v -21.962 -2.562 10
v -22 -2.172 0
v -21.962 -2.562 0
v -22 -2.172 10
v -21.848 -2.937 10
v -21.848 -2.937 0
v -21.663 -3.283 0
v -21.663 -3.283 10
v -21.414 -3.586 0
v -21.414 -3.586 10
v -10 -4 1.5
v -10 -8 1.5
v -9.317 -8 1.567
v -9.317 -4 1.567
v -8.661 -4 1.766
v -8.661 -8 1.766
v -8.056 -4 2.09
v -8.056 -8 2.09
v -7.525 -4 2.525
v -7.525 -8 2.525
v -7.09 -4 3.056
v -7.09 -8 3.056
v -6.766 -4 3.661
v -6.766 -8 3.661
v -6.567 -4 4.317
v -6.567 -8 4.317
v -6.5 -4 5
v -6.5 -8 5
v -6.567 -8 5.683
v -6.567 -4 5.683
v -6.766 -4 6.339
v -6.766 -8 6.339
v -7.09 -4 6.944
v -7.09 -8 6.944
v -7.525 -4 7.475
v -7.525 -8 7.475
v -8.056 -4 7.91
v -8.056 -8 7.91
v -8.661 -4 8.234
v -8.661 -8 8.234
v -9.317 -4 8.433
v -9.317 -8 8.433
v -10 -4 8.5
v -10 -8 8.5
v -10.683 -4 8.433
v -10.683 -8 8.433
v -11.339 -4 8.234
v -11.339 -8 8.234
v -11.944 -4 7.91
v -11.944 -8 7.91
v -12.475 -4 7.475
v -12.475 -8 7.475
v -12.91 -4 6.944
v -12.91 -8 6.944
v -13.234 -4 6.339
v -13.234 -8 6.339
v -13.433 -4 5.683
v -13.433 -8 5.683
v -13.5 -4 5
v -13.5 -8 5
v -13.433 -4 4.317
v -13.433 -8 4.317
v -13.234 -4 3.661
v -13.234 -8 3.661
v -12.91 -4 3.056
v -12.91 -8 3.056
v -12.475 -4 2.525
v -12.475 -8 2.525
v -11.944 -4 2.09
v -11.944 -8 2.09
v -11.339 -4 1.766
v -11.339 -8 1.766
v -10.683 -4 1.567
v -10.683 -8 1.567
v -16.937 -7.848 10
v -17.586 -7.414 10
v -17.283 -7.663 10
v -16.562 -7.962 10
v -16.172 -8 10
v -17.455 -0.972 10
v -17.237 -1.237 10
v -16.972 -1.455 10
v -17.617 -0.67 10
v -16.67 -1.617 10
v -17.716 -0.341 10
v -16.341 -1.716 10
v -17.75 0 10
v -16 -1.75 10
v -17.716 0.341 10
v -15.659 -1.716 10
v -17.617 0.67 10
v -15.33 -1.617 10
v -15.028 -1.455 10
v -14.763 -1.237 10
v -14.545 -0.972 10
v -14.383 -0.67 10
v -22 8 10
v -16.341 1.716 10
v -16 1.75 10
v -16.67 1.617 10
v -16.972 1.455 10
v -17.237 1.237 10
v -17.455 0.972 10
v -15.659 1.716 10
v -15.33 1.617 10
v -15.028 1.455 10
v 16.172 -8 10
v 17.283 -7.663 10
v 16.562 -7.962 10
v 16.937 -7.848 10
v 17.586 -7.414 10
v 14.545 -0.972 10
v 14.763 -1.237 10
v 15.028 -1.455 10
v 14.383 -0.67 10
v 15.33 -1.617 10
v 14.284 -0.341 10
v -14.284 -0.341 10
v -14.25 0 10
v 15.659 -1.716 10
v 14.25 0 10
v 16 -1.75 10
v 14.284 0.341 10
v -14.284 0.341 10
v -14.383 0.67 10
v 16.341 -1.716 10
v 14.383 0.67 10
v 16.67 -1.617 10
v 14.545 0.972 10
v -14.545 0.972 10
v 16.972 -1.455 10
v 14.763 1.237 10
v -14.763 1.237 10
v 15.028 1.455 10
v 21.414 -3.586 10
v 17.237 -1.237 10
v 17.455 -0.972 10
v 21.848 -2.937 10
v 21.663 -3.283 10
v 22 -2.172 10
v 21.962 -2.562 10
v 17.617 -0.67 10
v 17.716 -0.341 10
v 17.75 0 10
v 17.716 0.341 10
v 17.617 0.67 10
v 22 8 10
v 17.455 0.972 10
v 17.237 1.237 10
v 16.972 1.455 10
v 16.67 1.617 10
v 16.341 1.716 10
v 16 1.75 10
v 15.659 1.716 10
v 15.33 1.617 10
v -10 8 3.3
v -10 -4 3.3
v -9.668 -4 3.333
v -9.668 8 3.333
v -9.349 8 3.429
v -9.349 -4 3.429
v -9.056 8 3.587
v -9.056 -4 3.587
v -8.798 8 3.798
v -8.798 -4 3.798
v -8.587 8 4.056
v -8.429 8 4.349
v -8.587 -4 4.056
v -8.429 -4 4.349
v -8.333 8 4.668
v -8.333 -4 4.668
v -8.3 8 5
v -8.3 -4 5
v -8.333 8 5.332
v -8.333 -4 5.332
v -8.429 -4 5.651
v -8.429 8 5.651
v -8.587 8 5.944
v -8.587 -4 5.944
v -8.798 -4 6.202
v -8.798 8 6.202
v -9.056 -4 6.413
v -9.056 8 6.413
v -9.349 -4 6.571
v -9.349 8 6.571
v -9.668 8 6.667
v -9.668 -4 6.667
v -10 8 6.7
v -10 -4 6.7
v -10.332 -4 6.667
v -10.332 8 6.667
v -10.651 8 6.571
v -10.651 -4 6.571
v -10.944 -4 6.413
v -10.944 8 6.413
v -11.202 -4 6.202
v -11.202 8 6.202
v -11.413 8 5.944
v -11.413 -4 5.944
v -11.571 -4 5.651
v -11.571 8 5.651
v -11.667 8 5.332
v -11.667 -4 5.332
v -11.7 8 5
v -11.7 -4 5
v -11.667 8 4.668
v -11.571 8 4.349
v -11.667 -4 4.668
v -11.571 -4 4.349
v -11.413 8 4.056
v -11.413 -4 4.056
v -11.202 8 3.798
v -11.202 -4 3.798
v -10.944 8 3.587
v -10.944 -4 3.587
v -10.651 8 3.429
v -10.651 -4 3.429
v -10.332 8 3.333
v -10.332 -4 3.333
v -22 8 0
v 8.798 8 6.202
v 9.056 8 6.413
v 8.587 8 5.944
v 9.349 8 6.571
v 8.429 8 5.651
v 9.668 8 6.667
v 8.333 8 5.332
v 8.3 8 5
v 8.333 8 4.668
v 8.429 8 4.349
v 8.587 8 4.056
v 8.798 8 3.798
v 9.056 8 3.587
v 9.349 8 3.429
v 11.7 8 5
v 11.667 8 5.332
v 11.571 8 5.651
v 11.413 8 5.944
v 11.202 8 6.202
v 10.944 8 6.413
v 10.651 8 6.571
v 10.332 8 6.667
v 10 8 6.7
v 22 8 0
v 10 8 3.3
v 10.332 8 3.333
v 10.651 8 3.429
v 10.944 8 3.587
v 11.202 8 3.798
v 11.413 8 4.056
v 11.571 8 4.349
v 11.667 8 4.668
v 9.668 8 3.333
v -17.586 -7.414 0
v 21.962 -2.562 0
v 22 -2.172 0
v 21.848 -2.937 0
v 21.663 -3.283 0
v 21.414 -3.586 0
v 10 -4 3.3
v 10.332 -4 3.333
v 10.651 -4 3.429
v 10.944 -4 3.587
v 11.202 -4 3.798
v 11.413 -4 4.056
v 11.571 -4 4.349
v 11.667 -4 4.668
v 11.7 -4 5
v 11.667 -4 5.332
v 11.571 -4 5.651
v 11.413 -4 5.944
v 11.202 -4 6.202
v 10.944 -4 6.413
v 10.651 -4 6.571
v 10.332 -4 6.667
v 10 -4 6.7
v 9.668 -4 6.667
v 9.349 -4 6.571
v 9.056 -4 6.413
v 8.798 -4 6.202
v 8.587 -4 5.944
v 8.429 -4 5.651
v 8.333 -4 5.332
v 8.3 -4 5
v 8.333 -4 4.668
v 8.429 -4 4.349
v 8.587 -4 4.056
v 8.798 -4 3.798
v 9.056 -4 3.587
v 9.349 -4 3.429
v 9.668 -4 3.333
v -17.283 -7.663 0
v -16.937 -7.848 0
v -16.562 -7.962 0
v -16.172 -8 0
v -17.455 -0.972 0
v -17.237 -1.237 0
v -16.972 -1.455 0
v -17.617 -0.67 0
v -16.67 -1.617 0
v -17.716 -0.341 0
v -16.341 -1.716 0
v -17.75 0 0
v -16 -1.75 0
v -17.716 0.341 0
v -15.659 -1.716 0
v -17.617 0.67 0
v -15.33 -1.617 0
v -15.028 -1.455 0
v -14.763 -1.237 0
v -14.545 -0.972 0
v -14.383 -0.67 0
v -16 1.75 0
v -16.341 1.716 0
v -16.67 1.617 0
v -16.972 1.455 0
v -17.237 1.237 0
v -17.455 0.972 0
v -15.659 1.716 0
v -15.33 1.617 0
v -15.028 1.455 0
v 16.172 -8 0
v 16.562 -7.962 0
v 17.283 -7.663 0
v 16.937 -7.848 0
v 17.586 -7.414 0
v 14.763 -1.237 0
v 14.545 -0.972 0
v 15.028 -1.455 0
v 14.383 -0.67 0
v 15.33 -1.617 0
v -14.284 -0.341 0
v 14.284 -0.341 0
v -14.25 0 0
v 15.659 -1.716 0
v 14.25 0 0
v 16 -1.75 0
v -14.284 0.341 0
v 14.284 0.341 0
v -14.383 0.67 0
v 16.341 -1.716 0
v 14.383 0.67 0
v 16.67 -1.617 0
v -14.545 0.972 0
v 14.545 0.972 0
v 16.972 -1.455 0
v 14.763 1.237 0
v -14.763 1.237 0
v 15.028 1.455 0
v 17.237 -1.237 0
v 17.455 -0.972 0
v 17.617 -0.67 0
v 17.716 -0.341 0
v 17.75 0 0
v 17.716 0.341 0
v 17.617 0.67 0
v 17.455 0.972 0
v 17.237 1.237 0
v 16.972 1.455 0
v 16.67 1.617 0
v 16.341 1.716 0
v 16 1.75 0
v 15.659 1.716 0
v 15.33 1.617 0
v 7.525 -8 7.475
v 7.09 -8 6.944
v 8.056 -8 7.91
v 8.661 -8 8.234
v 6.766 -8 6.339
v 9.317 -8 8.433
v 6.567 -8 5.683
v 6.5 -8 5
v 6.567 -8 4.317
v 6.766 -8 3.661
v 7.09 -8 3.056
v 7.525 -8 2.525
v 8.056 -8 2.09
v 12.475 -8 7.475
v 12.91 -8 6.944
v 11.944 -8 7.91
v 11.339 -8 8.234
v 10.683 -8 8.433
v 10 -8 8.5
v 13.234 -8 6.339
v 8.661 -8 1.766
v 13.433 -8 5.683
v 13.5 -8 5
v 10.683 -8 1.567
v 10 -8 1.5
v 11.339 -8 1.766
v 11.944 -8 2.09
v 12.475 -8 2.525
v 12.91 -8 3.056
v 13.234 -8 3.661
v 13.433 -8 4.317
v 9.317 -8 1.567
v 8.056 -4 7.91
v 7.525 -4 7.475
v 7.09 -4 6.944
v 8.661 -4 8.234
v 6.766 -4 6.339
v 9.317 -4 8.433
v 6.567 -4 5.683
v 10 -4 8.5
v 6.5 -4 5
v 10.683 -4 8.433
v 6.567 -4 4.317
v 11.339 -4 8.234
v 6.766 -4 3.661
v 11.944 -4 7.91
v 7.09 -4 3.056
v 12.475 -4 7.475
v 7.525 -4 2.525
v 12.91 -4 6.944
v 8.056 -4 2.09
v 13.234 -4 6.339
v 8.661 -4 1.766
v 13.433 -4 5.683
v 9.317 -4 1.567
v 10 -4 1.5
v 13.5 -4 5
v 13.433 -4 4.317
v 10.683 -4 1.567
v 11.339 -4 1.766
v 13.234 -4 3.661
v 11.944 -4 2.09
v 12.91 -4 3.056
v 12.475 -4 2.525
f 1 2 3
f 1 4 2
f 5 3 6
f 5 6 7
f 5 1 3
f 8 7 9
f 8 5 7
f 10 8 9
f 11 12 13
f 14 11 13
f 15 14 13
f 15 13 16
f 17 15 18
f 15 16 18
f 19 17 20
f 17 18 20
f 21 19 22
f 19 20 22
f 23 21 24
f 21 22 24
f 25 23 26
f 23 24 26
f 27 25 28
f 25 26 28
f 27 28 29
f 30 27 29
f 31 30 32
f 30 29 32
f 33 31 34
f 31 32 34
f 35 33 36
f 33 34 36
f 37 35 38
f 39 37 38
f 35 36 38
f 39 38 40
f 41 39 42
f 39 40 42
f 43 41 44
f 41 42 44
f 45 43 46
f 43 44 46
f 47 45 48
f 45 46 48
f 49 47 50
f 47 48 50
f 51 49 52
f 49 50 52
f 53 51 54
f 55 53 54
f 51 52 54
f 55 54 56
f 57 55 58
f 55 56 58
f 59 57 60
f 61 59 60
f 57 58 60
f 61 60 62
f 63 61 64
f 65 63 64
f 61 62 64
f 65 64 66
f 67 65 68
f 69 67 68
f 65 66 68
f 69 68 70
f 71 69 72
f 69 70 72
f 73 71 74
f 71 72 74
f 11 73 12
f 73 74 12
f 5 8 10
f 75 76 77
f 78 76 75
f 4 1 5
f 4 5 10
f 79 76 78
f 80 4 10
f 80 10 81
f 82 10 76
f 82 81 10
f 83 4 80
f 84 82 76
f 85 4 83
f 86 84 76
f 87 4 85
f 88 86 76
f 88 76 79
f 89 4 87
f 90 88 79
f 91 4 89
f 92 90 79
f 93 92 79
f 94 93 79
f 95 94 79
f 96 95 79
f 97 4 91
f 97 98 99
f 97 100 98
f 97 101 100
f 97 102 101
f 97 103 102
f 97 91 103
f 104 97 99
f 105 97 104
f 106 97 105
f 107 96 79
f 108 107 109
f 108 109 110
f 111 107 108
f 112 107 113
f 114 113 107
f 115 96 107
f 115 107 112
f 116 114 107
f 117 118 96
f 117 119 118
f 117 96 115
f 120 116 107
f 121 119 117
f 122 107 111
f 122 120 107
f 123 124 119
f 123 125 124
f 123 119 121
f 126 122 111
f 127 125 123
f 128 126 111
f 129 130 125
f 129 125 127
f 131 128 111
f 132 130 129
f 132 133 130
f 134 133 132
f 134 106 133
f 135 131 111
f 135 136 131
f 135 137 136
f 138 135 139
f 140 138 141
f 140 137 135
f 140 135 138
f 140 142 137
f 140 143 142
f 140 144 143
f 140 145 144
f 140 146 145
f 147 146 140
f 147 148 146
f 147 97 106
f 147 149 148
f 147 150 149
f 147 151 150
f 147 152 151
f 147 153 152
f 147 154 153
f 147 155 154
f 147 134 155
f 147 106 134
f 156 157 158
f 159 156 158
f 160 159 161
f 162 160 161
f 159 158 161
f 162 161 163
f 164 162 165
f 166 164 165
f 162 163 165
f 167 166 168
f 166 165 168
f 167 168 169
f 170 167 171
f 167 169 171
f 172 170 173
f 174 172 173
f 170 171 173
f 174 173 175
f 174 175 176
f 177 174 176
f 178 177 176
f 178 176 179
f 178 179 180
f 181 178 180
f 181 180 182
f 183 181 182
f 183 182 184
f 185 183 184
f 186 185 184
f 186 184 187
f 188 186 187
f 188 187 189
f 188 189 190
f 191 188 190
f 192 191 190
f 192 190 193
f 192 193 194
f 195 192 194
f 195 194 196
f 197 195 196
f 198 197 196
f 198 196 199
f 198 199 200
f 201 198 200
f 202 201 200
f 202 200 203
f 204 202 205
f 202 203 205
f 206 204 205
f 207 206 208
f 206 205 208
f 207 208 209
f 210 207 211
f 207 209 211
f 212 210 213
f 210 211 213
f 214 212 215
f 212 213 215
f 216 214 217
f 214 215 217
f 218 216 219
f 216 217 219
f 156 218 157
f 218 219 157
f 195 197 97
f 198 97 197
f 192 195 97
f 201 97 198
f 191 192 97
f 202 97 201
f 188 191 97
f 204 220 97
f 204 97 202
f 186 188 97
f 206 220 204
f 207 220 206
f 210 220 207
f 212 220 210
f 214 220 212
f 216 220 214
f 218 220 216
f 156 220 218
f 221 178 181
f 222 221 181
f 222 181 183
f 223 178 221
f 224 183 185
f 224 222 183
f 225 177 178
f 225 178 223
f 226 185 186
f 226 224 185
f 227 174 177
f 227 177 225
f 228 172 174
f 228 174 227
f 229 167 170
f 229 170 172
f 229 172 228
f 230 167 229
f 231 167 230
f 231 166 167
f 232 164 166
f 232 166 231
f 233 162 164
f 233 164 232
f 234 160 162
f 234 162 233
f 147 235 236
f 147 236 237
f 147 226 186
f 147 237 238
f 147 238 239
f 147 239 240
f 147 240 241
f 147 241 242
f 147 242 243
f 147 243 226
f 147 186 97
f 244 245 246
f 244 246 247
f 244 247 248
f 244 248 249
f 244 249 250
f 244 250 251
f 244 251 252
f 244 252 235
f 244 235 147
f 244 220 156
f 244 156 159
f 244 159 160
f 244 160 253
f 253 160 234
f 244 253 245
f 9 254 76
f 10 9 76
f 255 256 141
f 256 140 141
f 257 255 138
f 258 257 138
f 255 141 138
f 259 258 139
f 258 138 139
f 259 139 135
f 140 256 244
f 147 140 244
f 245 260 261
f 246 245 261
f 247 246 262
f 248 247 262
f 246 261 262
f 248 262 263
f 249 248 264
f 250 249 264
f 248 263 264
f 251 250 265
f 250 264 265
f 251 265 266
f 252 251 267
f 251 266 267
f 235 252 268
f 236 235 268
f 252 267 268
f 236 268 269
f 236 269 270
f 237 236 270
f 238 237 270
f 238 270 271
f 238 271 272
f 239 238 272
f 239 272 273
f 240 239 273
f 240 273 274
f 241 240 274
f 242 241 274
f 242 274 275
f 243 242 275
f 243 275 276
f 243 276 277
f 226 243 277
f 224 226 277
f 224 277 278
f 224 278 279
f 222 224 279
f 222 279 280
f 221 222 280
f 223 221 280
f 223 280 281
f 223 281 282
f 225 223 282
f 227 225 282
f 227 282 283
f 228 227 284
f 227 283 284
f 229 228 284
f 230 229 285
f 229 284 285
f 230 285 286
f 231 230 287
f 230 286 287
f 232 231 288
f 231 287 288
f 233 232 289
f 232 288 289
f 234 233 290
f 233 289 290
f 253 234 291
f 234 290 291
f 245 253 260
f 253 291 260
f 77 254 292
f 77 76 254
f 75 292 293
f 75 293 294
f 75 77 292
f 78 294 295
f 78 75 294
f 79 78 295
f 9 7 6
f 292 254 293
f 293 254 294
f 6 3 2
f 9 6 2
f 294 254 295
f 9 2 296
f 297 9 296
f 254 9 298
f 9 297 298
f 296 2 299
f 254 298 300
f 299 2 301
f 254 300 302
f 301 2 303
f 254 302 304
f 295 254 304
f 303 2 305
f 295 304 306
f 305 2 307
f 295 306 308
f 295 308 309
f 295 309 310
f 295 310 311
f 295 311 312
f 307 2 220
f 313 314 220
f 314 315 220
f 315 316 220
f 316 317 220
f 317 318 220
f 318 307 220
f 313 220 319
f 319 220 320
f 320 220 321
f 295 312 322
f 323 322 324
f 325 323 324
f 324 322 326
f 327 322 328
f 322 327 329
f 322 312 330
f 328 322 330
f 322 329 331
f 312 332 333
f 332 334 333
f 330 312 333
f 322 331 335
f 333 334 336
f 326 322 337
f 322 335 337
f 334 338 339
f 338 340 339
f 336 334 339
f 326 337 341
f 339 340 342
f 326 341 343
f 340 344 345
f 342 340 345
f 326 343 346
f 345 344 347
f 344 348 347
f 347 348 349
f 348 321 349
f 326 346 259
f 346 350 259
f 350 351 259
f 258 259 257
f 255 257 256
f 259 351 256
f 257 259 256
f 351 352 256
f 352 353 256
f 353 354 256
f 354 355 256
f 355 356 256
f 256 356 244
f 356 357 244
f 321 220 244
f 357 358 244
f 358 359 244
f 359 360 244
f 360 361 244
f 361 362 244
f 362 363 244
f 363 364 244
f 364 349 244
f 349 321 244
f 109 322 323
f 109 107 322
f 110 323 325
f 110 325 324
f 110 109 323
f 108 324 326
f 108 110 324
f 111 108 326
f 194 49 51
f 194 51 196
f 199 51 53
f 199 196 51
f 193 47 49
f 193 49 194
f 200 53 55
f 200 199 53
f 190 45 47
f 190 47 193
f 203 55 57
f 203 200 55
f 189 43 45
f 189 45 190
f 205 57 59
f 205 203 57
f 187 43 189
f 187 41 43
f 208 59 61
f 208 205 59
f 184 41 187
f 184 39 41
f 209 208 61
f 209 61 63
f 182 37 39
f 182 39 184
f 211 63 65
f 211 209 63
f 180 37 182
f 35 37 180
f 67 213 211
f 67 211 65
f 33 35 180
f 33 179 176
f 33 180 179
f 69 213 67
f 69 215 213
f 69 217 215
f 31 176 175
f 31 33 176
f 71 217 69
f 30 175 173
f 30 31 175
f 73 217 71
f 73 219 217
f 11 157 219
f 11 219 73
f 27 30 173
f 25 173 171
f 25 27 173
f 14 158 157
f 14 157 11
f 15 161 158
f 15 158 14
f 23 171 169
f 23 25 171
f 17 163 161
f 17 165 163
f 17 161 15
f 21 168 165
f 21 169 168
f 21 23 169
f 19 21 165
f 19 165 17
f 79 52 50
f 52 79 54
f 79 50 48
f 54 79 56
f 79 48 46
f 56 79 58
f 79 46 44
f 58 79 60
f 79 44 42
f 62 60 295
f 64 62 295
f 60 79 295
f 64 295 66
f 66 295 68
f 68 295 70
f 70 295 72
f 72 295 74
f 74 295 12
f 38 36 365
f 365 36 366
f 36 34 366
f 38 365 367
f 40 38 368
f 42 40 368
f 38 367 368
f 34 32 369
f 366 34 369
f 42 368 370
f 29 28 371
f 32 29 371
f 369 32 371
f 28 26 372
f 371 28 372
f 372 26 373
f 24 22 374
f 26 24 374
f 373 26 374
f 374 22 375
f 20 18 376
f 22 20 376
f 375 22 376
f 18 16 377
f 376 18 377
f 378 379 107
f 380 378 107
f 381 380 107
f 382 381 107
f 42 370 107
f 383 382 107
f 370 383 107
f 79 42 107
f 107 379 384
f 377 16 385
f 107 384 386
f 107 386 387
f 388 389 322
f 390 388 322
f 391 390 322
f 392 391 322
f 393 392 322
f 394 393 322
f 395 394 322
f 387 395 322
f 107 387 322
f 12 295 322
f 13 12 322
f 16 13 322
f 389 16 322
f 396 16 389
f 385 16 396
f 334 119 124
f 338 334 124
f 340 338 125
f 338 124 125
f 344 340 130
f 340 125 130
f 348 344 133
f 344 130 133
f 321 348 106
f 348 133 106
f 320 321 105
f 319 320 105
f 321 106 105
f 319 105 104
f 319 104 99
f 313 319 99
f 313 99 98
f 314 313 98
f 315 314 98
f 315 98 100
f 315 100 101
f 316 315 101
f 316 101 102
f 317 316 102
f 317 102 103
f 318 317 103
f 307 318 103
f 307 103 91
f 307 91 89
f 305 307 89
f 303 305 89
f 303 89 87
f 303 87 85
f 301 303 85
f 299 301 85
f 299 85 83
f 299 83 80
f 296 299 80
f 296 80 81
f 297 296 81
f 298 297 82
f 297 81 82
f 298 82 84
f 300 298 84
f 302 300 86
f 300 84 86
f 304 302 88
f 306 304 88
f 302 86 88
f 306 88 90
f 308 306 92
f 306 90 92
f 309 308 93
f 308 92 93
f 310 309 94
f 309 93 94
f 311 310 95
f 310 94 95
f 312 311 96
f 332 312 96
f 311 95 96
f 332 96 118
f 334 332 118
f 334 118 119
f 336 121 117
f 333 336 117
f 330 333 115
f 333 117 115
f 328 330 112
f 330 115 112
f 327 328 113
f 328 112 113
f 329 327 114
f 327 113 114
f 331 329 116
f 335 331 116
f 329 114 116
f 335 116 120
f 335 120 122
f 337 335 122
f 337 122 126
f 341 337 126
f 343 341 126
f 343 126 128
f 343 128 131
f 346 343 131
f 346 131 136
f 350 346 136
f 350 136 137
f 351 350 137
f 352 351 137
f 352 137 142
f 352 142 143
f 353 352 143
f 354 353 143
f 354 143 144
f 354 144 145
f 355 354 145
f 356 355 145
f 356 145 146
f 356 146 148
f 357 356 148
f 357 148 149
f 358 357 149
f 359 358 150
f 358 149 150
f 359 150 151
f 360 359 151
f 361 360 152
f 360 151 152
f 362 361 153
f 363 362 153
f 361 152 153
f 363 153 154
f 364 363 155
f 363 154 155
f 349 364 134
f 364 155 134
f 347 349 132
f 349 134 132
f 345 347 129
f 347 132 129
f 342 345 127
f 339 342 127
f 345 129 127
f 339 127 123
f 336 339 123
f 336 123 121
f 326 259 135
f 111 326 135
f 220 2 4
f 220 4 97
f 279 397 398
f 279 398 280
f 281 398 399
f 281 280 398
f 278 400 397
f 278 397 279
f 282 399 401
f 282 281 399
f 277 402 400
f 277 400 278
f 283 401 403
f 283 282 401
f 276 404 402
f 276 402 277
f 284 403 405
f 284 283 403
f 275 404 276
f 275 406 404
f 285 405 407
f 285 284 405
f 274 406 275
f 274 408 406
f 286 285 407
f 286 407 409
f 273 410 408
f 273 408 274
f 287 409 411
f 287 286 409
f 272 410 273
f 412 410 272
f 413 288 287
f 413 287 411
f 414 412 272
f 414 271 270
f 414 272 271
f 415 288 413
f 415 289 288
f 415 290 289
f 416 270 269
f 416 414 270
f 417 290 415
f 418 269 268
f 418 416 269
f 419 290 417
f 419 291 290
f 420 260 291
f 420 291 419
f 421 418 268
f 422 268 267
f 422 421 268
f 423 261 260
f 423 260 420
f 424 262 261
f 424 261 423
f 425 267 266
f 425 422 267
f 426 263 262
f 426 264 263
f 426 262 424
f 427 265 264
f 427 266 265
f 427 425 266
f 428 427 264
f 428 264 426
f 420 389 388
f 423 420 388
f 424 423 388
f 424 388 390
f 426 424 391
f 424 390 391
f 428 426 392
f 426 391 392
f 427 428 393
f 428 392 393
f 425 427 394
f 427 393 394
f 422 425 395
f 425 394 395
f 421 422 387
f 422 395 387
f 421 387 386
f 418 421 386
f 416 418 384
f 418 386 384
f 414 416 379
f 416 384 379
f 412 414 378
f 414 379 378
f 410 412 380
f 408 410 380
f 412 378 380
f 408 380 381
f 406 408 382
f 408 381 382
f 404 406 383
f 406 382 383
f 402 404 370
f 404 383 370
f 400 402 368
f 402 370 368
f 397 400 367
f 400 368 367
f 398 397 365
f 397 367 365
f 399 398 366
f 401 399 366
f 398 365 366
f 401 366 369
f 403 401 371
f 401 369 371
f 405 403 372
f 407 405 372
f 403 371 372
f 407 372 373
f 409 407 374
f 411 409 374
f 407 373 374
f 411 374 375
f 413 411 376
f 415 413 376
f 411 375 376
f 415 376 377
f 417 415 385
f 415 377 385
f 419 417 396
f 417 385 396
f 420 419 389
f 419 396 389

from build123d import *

# Parameters (mm, degrees)
SKETCH1_W           = 44
SKETCH1_H           = 16
BOSS_EXTRUDE1_DEPTH = 10
SKETCH2_R           = 1.7
CUT_EXTRUDE1_DEPTH  = 25
SKETCH3_R           = 1.75
CUT_EXTRUDE2_DEPTH  = 25
CHAMFER1_SIZE       = 5
FILLET1_R           = 2
SKETCH4_R           = 3.5
CUT_EXTRUDE3_DEPTH  = 4


with BuildPart() as part:
    # Sketch1 → Boss-Extrude1 (new body)
    with BuildSketch(Plane.XY):
        Rectangle(SKETCH1_W, SKETCH1_H)
    extrude(amount=BOSS_EXTRUDE1_DEPTH)

    # Sketch2 → Cut-Extrude1 (cut)
    with BuildSketch(Plane.XZ.offset(8)):
        with Locations(Location((-10, 5, 0), (0, 0, 270))):
            Circle(SKETCH2_R)
        with Locations(Location((10, 5, 0), (0, 0, 270))):
            Circle(SKETCH2_R)
    extrude(amount=-CUT_EXTRUDE1_DEPTH, mode=Mode.SUBTRACT)

    # Sketch3 → Cut-Extrude2 (cut)
    with BuildSketch(Plane.XY.offset(10)):
        with Locations((-16, 0)):
            Circle(SKETCH3_R)
        with Locations(Location((16, 0, 0), (0, 0, 180))):
            Circle(SKETCH3_R)
    extrude(amount=-CUT_EXTRUDE2_DEPTH, mode=Mode.SUBTRACT)

    # Chamfer1
    chamfer1_edges = [part.edges().sort_by_distance(p)[0] for p in [
        (22, -8, 5),
        (-22, -8, 5),
    ]]
    chamfer(chamfer1_edges, length=CHAMFER1_SIZE)

    # Fillet1
    fillet1_edges = [part.edges().sort_by_distance(p)[0] for p in [
        (22, -3, 5),
        (-17, -8, 5),
        (17, -8, 5),
        (-22, -3, 5),
    ]]
    fillet(fillet1_edges, radius=FILLET1_R)

    # Sketch4 → Cut-Extrude3 (cut)
    with BuildSketch(Plane.XZ.offset(8)):
        with Locations(Location((10, 5, 0), (0, 0, 270))):
            Circle(SKETCH4_R)
        with Locations(Location((-10, 5, 0), (0, 0, 270))):
            Circle(SKETCH4_R)
    extrude(amount=-CUT_EXTRUDE3_DEPTH, mode=Mode.SUBTRACT)


solid = part.part
